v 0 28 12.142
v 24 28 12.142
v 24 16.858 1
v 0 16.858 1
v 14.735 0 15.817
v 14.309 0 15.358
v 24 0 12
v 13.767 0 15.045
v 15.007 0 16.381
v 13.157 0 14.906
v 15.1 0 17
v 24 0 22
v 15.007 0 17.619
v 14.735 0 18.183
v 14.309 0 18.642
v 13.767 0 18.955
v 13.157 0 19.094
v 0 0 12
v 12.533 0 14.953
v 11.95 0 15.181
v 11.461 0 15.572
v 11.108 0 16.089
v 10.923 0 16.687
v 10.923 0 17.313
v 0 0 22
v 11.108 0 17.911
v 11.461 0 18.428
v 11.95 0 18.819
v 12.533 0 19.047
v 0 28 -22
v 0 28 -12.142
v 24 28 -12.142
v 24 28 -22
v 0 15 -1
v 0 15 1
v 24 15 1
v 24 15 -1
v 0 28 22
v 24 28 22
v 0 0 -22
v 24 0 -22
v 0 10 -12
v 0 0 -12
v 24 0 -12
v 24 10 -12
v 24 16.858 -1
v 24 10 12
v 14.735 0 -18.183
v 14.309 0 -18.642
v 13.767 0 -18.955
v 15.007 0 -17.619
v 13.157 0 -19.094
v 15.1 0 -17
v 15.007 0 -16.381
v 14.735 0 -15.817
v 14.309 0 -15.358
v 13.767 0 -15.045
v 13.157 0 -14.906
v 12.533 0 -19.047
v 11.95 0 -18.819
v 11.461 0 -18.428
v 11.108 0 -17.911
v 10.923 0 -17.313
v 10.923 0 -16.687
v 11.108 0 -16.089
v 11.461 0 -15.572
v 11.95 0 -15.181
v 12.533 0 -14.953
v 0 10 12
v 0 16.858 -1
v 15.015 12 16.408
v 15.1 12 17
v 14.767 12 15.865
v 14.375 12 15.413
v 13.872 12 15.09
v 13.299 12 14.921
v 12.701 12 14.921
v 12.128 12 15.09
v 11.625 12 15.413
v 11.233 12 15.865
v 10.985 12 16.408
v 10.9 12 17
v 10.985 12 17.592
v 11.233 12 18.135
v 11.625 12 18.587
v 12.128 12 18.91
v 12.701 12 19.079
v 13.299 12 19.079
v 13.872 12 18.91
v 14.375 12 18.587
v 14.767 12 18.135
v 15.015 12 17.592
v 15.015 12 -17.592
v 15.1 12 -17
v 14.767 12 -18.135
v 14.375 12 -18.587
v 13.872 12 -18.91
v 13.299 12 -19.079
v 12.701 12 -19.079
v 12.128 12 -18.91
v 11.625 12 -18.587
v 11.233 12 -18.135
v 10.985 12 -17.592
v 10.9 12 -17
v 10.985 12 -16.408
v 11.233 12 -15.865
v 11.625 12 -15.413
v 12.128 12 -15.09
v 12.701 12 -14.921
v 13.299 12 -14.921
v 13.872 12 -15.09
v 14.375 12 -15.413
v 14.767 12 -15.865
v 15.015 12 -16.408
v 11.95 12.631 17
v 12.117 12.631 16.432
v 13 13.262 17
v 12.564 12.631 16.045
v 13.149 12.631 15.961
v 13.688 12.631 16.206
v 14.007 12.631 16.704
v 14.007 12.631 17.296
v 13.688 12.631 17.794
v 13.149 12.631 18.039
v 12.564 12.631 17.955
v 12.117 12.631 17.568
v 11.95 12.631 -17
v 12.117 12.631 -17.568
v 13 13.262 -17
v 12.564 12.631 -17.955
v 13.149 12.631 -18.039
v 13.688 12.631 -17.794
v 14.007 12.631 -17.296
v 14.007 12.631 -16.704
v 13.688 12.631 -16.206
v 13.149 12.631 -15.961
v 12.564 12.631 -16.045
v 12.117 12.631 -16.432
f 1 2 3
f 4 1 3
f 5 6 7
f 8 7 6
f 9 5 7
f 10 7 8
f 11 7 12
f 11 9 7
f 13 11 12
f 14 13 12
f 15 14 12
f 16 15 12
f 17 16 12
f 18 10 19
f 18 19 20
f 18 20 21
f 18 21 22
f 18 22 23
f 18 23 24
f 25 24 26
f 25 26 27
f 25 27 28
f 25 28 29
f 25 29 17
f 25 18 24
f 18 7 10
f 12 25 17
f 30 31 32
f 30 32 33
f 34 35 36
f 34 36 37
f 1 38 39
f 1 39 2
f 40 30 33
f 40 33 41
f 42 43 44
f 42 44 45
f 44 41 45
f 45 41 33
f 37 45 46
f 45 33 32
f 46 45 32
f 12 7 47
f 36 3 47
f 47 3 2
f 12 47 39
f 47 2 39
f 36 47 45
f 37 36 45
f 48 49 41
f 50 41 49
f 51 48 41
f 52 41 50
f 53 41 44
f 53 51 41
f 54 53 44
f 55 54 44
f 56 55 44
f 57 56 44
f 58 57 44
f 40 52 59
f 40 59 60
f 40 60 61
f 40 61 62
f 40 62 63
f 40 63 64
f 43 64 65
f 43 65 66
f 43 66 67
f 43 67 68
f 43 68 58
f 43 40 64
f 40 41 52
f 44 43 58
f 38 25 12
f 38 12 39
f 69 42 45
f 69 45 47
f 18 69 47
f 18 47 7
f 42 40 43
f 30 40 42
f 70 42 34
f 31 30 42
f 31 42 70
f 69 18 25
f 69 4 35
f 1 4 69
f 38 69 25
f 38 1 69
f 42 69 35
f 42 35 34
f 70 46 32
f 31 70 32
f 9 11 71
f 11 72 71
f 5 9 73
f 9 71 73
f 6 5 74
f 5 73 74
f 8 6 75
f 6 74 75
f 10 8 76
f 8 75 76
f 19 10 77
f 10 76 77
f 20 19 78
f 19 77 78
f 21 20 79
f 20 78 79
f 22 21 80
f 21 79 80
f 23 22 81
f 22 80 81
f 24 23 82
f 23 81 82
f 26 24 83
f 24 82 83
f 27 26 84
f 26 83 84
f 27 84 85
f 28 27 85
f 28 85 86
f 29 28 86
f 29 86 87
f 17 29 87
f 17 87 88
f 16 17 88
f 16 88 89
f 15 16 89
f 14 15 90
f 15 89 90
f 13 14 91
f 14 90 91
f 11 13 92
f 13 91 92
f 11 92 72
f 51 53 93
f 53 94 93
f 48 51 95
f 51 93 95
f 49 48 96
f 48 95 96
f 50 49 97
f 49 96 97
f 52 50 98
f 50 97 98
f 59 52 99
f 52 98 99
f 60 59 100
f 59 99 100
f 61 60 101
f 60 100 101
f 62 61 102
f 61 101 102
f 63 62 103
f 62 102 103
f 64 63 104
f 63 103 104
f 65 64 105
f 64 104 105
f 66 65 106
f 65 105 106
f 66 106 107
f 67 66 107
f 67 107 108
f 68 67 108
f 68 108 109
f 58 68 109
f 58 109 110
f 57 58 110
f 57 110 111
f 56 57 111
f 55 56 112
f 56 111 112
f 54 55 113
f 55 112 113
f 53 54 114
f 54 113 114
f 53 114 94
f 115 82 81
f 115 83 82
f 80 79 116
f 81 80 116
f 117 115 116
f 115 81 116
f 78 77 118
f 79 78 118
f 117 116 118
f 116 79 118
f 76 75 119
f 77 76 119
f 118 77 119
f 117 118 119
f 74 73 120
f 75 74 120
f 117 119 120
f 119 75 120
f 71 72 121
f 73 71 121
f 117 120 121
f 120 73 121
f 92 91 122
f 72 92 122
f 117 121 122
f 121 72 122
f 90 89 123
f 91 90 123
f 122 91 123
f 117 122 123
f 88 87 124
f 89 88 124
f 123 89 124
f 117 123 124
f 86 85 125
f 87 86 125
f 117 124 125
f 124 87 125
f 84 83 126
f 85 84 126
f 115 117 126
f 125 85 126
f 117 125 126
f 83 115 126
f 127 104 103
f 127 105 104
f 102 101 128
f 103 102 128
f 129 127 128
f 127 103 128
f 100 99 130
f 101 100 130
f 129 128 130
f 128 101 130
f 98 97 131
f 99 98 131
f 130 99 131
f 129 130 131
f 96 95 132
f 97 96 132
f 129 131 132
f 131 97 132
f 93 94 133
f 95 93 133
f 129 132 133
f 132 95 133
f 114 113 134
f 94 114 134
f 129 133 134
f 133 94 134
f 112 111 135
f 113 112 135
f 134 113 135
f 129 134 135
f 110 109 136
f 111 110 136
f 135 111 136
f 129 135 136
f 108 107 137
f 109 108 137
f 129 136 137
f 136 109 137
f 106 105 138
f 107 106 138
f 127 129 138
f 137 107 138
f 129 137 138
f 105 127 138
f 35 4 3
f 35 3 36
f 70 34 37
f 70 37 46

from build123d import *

# Parameters (mm, degrees)
BOSS_EXTRUDE1_DEPTH   = 24
M5_TAPPED_HOLE1_D     = 4.2
M5_TAPPED_HOLE1_DEPTH = 12
M5_TAPPED_HOLE1_TIP   = 1.2618073


with BuildPart() as part:
    # Sketch1 → Boss-Extrude1 (new body)
    with BuildSketch(Plane(origin=(0, 0, 0), x_dir=(0, 0, -1), z_dir=(1, 0, 0))):
        Polygon((12, 10), (-12, 10), (-12, 0), (-22, 0), (-22, 28), (-12.142135624, 28), (-1, 16.857864376), (-1, 15), (1, 15), (1, 16.857864376), (12.142135624, 28), (22, 28), (22, 0), (12, 0), align=None)
    extrude(amount=BOSS_EXTRUDE1_DEPTH)

    # M5 Tapped Hole1
    with Locations(Plane(origin=(0, 0, 0), x_dir=(-1, 0, 0), z_dir=(0, -1, 0))):
        with Locations((-13, 17), (-13, -17)):
            Hole(M5_TAPPED_HOLE1_D / 2, depth=M5_TAPPED_HOLE1_DEPTH)
            with Locations((0, 0, -(M5_TAPPED_HOLE1_DEPTH + M5_TAPPED_HOLE1_TIP / 2))):  # 118° drill point
                Cone(0, M5_TAPPED_HOLE1_D / 2, M5_TAPPED_HOLE1_TIP, mode=Mode.SUBTRACT)


solid = part.part
